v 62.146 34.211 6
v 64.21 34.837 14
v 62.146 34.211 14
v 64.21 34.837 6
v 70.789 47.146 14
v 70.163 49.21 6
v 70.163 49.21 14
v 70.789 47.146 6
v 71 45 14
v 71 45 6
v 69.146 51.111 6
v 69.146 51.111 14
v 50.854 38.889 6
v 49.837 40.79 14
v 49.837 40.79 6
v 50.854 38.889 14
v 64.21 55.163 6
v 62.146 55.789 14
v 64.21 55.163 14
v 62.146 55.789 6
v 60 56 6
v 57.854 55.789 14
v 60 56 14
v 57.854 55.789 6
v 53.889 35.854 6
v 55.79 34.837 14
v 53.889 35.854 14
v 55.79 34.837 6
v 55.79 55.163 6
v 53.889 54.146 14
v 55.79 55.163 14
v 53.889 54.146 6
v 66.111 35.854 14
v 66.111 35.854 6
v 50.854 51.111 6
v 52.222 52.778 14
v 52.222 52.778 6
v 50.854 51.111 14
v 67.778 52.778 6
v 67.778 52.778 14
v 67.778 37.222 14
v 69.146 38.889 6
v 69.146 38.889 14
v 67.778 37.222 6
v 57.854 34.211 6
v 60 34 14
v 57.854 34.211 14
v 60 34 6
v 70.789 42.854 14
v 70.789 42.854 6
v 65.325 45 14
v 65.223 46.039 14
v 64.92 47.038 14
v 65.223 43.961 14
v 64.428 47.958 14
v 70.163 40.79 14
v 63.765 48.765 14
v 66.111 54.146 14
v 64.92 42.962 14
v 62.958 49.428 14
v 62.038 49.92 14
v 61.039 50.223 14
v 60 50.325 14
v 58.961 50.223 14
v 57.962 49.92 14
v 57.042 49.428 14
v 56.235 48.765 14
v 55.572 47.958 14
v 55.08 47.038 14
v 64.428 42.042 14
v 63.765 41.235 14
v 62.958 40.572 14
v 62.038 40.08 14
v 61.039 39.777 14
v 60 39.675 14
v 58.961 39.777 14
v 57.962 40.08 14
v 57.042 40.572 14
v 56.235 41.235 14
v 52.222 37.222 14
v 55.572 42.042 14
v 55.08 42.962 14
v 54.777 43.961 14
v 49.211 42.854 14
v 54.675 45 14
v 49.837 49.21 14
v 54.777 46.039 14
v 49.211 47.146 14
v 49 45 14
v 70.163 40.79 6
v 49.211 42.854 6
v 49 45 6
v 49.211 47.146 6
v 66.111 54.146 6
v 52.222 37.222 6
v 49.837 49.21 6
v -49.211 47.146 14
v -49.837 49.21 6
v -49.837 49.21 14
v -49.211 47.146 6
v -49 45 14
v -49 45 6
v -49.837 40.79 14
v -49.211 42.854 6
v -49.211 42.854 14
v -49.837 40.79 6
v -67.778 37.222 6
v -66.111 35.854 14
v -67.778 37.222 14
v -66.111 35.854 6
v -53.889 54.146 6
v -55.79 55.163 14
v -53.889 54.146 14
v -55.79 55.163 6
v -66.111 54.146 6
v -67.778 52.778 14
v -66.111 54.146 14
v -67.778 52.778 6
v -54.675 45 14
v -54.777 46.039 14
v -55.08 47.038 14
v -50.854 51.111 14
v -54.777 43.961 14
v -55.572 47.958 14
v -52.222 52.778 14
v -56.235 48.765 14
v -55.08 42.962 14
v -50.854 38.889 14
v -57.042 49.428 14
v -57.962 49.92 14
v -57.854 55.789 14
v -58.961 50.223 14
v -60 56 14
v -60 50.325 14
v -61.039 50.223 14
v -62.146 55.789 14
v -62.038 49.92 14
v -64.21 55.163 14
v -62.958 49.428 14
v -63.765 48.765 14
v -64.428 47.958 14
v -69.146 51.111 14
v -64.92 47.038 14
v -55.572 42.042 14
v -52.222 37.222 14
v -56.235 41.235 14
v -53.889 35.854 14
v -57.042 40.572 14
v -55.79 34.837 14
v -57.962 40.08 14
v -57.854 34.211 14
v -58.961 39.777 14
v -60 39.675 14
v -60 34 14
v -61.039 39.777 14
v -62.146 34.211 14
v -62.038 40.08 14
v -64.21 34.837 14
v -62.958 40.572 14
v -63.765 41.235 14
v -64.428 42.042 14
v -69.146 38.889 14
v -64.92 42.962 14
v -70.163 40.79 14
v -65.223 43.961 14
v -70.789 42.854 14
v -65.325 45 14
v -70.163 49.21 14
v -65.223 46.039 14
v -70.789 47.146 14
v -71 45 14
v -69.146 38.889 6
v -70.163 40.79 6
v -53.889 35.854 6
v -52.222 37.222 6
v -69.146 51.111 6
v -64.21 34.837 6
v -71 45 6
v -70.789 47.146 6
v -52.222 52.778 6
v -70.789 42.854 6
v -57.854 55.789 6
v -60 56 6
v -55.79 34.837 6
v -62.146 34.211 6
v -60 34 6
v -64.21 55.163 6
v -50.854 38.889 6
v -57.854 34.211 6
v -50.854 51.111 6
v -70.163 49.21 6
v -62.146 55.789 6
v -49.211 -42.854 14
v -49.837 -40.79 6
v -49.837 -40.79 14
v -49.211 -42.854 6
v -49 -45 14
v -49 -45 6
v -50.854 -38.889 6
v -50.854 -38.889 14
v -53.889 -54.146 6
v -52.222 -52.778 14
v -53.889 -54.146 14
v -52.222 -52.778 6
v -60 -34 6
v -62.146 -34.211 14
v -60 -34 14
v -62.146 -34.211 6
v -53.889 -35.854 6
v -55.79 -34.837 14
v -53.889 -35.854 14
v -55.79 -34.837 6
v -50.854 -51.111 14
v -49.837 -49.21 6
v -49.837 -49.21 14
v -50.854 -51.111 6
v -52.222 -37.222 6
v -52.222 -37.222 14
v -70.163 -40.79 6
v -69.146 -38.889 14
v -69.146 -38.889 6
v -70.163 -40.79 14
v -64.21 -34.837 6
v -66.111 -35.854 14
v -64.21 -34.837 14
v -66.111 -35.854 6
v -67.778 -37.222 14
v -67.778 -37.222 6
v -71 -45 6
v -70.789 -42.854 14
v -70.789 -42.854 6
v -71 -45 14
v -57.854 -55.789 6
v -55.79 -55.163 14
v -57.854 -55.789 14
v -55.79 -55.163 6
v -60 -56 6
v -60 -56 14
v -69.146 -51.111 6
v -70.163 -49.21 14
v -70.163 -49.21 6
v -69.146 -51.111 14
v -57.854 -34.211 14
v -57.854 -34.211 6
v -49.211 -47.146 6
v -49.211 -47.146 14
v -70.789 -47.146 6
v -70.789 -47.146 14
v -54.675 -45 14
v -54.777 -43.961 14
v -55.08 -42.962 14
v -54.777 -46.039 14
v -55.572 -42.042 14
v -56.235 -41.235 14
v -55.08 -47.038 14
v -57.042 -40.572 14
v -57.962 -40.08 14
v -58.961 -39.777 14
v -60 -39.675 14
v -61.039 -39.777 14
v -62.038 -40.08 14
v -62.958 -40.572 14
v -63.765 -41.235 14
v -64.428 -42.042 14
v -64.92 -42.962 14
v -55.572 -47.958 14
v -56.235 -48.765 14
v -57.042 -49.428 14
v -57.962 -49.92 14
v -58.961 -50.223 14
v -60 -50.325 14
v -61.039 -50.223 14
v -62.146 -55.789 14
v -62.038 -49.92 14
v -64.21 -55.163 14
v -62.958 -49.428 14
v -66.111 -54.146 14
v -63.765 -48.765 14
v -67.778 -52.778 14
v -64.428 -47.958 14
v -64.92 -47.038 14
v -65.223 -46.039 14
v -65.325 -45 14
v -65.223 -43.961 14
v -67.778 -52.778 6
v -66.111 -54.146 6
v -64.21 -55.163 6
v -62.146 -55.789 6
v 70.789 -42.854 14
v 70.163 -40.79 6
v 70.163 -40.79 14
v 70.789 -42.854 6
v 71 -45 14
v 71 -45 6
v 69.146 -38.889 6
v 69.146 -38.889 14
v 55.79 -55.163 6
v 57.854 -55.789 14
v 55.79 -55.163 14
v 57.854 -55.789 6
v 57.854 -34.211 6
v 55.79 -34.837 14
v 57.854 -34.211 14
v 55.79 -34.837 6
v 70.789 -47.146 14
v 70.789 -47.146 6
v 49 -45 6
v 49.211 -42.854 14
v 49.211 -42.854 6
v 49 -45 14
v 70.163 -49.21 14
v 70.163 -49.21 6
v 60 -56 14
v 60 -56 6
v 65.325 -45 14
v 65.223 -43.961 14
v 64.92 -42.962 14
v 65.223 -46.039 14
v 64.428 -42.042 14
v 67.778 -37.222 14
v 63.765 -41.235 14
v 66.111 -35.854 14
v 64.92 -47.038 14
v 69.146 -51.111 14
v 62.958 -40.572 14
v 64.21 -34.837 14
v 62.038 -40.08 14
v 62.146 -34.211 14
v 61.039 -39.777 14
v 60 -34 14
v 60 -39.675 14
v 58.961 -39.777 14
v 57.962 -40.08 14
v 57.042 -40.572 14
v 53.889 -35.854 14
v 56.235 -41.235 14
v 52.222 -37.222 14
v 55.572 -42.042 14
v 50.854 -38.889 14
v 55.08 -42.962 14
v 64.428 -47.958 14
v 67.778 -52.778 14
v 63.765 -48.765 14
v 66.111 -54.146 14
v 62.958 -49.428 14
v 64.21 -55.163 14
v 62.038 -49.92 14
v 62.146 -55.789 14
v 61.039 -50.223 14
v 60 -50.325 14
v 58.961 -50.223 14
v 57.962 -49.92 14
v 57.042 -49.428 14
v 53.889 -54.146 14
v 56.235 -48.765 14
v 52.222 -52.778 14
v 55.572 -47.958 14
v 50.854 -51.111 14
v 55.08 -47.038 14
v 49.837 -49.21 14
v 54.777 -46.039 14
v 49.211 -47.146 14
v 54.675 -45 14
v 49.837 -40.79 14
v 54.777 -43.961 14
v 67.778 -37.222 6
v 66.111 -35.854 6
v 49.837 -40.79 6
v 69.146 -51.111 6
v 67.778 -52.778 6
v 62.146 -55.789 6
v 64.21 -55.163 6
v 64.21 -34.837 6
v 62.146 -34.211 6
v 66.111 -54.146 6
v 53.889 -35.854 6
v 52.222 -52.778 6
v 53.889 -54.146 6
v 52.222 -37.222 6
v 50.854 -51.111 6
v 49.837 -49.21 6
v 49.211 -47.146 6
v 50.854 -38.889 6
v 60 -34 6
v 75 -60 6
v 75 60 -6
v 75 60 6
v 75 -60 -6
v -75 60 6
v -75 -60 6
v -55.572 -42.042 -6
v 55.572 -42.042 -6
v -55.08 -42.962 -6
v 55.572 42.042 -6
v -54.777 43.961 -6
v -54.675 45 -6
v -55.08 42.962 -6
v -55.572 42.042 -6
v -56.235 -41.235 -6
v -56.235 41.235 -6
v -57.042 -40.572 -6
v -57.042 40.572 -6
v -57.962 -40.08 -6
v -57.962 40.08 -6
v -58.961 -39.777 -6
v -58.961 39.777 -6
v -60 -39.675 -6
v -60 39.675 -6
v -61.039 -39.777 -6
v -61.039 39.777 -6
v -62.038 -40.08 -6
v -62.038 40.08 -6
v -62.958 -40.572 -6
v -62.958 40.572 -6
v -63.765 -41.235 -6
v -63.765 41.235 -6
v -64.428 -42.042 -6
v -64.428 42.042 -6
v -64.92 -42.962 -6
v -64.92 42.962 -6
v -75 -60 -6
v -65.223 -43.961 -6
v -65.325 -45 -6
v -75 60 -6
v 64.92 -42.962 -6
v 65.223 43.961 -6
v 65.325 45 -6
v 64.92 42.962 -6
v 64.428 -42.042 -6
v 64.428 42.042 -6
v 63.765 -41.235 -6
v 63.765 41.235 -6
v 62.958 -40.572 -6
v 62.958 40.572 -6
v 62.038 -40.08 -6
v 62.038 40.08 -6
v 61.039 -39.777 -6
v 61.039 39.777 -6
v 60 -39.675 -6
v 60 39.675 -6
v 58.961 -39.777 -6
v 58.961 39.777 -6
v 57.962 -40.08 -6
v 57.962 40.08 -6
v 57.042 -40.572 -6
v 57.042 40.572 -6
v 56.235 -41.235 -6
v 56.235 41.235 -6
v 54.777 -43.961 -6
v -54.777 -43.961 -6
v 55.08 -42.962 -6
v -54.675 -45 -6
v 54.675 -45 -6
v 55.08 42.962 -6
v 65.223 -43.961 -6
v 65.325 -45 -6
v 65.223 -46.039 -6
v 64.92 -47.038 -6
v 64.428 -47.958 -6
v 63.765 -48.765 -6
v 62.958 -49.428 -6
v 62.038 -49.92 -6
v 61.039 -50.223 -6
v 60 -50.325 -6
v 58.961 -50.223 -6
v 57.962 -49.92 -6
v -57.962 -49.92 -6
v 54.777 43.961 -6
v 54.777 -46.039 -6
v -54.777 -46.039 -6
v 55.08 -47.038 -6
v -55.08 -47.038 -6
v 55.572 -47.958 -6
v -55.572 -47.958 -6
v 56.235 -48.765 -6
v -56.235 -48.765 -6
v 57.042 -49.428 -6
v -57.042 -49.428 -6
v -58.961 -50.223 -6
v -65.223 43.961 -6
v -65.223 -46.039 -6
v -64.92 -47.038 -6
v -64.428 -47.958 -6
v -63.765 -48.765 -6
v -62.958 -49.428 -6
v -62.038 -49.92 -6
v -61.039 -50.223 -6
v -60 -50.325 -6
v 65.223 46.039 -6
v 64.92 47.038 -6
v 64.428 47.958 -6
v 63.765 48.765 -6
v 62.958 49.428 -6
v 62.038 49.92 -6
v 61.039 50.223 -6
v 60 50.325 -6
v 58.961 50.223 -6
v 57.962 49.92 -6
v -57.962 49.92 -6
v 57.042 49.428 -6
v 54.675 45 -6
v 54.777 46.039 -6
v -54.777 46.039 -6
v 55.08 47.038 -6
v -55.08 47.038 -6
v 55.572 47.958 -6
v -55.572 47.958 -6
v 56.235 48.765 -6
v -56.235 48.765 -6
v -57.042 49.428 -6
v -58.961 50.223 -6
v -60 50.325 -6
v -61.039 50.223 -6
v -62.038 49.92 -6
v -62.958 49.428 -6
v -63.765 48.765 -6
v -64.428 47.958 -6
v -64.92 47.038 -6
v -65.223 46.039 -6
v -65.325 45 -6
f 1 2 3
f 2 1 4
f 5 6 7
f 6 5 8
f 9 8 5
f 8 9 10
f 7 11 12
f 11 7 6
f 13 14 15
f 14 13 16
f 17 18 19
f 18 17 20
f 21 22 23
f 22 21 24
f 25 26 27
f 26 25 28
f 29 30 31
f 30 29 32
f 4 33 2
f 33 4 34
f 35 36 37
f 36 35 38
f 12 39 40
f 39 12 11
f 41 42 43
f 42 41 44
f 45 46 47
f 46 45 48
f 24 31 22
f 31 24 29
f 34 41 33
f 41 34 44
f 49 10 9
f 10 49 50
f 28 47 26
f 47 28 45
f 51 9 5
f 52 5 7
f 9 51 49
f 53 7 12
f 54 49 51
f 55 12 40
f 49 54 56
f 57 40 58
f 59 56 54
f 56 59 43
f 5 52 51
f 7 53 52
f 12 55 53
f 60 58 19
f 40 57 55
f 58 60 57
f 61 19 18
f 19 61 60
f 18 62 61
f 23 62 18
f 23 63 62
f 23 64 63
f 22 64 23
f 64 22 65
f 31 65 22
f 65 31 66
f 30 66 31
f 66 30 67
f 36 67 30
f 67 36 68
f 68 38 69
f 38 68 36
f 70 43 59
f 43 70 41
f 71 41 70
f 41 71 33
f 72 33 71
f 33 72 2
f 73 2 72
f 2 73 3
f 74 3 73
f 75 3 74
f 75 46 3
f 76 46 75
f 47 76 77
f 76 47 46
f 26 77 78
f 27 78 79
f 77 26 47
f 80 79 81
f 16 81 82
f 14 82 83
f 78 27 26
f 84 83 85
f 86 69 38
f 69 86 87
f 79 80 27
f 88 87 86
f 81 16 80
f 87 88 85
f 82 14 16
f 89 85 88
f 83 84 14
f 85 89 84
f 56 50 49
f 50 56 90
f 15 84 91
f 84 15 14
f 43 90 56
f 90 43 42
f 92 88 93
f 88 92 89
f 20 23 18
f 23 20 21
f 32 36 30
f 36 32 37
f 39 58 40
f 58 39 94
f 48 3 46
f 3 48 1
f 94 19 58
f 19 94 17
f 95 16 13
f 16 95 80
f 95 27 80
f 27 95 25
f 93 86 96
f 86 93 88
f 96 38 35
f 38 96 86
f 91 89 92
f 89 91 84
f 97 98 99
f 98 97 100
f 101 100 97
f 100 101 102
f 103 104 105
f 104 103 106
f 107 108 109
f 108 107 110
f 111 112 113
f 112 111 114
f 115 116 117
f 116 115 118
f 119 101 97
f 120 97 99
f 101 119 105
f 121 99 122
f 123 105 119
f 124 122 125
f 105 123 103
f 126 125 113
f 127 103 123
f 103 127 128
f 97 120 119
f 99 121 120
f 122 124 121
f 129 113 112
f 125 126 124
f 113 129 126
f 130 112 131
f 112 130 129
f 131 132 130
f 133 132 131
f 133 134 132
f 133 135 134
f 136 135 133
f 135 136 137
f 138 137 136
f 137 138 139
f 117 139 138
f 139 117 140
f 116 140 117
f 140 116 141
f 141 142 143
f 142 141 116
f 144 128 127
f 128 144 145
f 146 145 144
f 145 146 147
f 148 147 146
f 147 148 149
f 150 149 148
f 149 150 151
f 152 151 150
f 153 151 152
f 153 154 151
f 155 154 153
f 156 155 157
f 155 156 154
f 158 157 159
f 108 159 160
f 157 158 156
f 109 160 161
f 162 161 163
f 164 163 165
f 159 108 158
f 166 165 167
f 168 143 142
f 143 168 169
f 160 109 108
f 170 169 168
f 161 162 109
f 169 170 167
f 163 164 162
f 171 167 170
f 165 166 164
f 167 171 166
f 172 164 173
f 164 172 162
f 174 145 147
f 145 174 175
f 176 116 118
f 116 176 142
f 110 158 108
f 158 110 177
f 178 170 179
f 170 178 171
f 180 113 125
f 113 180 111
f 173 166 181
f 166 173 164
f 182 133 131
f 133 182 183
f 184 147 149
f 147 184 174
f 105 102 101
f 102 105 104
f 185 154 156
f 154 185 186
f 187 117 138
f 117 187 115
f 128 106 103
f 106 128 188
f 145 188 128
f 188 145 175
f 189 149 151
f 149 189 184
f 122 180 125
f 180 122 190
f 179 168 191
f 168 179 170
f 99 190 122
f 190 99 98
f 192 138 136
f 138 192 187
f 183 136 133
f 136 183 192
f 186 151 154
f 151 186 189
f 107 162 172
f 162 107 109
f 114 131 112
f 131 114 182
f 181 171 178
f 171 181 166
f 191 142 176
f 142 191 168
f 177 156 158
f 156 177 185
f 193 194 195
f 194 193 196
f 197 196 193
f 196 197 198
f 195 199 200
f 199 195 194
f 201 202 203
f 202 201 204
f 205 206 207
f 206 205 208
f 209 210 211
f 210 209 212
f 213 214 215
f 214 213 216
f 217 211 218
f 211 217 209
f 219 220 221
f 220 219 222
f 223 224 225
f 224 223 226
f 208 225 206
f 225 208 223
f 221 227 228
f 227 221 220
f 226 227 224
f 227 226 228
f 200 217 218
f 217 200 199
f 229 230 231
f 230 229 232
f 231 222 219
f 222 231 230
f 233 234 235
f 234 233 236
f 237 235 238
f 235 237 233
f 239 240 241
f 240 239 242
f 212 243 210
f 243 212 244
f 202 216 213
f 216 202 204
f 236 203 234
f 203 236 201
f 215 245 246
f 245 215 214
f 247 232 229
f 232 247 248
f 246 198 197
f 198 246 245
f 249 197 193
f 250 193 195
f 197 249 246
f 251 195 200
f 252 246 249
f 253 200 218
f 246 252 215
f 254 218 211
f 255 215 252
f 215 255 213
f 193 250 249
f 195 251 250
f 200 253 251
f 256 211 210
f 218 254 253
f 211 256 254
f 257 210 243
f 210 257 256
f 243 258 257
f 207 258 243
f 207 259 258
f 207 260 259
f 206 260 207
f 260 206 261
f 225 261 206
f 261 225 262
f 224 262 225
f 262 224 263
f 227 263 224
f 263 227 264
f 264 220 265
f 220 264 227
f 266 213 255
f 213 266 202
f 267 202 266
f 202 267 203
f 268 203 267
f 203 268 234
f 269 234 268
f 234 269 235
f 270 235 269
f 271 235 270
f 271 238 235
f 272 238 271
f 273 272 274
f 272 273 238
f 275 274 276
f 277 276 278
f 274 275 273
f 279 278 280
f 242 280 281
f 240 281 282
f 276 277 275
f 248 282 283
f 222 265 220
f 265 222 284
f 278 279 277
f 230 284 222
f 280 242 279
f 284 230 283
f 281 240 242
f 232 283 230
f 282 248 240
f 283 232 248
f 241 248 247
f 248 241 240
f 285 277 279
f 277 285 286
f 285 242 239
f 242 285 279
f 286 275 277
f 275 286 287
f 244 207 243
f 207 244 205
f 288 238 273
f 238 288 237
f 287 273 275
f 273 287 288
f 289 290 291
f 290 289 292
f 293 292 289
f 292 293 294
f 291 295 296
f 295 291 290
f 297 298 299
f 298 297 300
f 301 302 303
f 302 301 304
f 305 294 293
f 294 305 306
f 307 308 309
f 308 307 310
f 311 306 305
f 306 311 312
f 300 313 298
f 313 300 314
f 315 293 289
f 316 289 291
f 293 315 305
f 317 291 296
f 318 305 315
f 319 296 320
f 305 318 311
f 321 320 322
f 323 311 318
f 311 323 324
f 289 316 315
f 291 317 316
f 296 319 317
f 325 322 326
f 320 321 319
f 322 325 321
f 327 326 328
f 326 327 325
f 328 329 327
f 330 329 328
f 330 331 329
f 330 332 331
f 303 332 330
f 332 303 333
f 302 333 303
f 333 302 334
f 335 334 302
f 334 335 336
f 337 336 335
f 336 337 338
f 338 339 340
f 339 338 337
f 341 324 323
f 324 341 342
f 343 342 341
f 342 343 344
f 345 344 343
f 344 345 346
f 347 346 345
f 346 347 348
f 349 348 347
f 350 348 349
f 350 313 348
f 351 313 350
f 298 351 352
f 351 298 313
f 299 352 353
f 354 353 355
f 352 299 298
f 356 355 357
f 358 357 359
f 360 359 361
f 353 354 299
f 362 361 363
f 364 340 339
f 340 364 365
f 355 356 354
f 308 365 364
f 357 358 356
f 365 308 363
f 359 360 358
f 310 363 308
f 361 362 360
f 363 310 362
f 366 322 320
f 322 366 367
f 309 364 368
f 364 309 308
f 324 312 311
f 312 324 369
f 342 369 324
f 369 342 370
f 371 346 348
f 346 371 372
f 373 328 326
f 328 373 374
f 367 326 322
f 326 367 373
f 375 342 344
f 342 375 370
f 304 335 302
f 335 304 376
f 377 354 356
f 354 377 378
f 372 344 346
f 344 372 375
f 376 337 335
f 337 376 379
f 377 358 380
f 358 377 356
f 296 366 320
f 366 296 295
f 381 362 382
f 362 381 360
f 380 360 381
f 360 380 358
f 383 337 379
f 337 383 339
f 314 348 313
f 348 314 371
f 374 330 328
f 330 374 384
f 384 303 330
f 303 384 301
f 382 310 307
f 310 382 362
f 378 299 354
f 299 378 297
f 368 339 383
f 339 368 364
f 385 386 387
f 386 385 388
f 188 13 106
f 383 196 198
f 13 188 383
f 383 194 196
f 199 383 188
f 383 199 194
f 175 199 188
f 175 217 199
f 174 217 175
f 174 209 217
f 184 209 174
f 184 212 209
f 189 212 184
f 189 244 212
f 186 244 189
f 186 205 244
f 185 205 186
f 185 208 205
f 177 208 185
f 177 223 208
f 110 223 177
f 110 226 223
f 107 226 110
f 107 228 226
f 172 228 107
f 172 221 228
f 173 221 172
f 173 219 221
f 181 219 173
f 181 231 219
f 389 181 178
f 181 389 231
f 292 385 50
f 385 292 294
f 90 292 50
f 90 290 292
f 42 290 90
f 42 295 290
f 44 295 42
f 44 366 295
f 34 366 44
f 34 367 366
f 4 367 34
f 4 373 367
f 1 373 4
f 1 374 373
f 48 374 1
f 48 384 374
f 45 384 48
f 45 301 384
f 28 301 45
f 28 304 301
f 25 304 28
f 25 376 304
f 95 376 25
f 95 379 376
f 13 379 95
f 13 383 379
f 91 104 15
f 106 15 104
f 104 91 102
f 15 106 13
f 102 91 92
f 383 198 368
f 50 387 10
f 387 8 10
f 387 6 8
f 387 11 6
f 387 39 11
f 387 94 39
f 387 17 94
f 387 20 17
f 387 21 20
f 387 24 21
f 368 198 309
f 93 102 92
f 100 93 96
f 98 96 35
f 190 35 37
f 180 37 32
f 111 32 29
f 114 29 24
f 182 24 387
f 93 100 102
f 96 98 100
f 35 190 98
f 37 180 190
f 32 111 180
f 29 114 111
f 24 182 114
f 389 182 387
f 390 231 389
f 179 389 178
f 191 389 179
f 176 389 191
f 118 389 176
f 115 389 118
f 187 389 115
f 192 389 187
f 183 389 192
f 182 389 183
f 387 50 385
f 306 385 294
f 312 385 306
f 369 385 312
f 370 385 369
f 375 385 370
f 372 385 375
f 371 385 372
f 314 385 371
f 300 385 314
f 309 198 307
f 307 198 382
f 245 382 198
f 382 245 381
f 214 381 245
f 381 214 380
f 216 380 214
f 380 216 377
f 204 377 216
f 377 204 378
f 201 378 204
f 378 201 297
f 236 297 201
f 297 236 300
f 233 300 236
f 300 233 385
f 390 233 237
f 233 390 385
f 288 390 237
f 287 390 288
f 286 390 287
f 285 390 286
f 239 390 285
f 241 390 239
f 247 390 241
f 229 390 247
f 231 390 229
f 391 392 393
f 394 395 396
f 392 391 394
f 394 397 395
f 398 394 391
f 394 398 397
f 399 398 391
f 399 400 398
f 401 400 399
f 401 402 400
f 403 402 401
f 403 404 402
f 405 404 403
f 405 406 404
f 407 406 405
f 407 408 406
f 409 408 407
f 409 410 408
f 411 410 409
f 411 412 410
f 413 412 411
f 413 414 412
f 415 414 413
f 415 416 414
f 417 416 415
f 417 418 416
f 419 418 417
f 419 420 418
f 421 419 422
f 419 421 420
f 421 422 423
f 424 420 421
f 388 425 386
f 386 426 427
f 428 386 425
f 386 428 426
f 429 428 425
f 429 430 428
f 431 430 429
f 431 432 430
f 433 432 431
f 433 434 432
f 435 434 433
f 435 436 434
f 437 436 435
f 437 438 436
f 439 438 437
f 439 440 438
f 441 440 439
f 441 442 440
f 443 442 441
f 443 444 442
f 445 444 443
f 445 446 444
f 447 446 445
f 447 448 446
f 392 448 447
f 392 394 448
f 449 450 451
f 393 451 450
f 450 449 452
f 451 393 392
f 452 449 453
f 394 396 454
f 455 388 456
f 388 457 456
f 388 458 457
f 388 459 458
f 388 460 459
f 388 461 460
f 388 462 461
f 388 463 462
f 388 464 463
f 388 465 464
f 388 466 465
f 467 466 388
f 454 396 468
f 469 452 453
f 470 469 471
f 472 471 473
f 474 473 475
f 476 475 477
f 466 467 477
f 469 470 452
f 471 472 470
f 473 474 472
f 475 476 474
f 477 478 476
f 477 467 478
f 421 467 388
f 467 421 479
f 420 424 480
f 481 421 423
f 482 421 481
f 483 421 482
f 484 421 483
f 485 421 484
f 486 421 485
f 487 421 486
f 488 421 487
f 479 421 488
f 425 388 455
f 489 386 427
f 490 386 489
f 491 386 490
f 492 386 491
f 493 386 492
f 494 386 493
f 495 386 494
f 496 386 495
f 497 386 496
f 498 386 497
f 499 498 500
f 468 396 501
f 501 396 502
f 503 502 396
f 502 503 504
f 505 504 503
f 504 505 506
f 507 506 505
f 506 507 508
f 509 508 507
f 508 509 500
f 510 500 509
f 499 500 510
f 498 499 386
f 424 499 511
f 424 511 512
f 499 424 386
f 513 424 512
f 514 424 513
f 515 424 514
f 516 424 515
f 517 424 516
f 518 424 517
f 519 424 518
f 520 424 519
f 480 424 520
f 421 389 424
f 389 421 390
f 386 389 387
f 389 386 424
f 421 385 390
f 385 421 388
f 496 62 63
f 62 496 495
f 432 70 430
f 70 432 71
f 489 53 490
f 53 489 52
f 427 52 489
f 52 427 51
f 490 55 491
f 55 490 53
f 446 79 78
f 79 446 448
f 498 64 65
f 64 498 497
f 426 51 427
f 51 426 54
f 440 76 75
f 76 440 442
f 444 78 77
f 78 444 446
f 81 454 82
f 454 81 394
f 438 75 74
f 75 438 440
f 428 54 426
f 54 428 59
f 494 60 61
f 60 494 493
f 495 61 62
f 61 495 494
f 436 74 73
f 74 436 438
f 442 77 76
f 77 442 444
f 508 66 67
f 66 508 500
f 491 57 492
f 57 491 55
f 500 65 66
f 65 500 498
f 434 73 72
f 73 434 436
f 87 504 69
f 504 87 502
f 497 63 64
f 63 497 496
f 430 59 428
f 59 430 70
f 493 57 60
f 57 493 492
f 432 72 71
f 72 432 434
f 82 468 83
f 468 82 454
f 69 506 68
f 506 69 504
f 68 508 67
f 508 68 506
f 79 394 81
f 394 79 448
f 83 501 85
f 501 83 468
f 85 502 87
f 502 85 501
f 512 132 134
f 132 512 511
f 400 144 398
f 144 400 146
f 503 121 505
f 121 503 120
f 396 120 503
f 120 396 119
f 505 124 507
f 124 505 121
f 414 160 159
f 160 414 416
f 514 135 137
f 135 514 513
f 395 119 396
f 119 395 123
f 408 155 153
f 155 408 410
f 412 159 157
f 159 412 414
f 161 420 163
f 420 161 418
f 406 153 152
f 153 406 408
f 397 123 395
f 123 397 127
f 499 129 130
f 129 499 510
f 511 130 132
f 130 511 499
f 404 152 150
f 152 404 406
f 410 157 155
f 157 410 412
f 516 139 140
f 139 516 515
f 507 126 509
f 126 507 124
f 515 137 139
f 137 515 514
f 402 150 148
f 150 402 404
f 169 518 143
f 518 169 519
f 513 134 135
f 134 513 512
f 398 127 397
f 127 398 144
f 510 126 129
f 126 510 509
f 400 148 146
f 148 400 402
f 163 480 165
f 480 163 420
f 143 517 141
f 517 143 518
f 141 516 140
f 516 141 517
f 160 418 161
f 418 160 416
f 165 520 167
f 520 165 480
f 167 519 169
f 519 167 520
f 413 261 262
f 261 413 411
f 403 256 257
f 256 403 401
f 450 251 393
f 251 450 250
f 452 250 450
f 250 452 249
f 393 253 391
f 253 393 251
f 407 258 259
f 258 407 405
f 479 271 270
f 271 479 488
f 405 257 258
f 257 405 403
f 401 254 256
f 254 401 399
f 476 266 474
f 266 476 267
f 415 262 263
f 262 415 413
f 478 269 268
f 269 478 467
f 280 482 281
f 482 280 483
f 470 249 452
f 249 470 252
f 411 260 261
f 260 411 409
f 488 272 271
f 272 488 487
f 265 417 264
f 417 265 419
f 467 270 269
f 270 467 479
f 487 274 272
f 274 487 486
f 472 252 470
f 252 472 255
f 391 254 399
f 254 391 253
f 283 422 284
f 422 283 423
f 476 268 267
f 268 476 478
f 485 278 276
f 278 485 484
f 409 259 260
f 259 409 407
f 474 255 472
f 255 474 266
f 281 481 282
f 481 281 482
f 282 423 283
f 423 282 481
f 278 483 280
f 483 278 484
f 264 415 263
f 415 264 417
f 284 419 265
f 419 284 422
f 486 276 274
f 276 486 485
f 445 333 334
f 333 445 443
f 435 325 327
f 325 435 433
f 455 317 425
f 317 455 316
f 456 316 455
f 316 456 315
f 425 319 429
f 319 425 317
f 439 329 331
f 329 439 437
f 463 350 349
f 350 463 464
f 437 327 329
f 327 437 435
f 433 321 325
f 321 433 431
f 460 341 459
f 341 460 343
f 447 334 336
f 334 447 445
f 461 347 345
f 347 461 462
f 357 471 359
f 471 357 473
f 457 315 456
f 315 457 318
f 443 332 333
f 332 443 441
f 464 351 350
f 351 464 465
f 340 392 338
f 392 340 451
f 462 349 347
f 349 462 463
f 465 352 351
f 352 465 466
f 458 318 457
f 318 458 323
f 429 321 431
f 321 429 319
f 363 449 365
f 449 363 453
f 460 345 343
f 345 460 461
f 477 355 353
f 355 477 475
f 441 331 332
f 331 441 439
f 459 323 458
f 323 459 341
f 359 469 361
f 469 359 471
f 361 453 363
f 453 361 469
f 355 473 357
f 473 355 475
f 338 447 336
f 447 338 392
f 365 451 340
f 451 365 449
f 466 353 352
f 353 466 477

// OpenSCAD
$fn = 32;

// ----------------------------------------------------------------------
// Anchor pads 150 x 120 x 20
// four corner bosses with anchor holes
// ----------------------------------------------------------------------

// --- parameters (mm) ---
plate = [150, 120, 12];  // base plate size (x, y, z)
pads = 4;                // boss count, one per corner
edge = 15;               // boss centre offset from the plate edge
boss_d = 22;             // boss diameter
boss_h = 8;              // boss height above the base plate
bore_d = 10.5;           // nominal hole diameter from the drawing
print_allowance = 0.15;  // clearance added for printing

// --- derived feature positions (mm) ---
hole_d = bore_d + print_allowance;  // = 10.65   hole diameter as printed
height = plate[2] + boss_h;         // = 20   overall height of the part
corner_x = plate[0] / 2 - edge;     // = 60   boss centre X
corner_y = plate[1] / 2 - edge;     // = 45   boss centre Y
feature_centers = [
  [corner_x, corner_y],
  [-corner_x, corner_y],
  [-corner_x, -corner_y],
  [corner_x, -corner_y]
];   // boss centres, anchor holes are drilled there

// base plate, four bosses standing on it, anchor holes all the way through
difference() {
  union() {
    cube(plate, center = true);
    for (centre = feature_centers)
      translate([centre[0], centre[1], plate[2] / 2 - 1])
        cylinder(d = boss_d, h = boss_h + 1);
  }
  for (centre = feature_centers)
    translate([centre[0], centre[1], -height])
      cylinder(d = hole_d, h = 2 * height + 2);  // through boss and plate
}
